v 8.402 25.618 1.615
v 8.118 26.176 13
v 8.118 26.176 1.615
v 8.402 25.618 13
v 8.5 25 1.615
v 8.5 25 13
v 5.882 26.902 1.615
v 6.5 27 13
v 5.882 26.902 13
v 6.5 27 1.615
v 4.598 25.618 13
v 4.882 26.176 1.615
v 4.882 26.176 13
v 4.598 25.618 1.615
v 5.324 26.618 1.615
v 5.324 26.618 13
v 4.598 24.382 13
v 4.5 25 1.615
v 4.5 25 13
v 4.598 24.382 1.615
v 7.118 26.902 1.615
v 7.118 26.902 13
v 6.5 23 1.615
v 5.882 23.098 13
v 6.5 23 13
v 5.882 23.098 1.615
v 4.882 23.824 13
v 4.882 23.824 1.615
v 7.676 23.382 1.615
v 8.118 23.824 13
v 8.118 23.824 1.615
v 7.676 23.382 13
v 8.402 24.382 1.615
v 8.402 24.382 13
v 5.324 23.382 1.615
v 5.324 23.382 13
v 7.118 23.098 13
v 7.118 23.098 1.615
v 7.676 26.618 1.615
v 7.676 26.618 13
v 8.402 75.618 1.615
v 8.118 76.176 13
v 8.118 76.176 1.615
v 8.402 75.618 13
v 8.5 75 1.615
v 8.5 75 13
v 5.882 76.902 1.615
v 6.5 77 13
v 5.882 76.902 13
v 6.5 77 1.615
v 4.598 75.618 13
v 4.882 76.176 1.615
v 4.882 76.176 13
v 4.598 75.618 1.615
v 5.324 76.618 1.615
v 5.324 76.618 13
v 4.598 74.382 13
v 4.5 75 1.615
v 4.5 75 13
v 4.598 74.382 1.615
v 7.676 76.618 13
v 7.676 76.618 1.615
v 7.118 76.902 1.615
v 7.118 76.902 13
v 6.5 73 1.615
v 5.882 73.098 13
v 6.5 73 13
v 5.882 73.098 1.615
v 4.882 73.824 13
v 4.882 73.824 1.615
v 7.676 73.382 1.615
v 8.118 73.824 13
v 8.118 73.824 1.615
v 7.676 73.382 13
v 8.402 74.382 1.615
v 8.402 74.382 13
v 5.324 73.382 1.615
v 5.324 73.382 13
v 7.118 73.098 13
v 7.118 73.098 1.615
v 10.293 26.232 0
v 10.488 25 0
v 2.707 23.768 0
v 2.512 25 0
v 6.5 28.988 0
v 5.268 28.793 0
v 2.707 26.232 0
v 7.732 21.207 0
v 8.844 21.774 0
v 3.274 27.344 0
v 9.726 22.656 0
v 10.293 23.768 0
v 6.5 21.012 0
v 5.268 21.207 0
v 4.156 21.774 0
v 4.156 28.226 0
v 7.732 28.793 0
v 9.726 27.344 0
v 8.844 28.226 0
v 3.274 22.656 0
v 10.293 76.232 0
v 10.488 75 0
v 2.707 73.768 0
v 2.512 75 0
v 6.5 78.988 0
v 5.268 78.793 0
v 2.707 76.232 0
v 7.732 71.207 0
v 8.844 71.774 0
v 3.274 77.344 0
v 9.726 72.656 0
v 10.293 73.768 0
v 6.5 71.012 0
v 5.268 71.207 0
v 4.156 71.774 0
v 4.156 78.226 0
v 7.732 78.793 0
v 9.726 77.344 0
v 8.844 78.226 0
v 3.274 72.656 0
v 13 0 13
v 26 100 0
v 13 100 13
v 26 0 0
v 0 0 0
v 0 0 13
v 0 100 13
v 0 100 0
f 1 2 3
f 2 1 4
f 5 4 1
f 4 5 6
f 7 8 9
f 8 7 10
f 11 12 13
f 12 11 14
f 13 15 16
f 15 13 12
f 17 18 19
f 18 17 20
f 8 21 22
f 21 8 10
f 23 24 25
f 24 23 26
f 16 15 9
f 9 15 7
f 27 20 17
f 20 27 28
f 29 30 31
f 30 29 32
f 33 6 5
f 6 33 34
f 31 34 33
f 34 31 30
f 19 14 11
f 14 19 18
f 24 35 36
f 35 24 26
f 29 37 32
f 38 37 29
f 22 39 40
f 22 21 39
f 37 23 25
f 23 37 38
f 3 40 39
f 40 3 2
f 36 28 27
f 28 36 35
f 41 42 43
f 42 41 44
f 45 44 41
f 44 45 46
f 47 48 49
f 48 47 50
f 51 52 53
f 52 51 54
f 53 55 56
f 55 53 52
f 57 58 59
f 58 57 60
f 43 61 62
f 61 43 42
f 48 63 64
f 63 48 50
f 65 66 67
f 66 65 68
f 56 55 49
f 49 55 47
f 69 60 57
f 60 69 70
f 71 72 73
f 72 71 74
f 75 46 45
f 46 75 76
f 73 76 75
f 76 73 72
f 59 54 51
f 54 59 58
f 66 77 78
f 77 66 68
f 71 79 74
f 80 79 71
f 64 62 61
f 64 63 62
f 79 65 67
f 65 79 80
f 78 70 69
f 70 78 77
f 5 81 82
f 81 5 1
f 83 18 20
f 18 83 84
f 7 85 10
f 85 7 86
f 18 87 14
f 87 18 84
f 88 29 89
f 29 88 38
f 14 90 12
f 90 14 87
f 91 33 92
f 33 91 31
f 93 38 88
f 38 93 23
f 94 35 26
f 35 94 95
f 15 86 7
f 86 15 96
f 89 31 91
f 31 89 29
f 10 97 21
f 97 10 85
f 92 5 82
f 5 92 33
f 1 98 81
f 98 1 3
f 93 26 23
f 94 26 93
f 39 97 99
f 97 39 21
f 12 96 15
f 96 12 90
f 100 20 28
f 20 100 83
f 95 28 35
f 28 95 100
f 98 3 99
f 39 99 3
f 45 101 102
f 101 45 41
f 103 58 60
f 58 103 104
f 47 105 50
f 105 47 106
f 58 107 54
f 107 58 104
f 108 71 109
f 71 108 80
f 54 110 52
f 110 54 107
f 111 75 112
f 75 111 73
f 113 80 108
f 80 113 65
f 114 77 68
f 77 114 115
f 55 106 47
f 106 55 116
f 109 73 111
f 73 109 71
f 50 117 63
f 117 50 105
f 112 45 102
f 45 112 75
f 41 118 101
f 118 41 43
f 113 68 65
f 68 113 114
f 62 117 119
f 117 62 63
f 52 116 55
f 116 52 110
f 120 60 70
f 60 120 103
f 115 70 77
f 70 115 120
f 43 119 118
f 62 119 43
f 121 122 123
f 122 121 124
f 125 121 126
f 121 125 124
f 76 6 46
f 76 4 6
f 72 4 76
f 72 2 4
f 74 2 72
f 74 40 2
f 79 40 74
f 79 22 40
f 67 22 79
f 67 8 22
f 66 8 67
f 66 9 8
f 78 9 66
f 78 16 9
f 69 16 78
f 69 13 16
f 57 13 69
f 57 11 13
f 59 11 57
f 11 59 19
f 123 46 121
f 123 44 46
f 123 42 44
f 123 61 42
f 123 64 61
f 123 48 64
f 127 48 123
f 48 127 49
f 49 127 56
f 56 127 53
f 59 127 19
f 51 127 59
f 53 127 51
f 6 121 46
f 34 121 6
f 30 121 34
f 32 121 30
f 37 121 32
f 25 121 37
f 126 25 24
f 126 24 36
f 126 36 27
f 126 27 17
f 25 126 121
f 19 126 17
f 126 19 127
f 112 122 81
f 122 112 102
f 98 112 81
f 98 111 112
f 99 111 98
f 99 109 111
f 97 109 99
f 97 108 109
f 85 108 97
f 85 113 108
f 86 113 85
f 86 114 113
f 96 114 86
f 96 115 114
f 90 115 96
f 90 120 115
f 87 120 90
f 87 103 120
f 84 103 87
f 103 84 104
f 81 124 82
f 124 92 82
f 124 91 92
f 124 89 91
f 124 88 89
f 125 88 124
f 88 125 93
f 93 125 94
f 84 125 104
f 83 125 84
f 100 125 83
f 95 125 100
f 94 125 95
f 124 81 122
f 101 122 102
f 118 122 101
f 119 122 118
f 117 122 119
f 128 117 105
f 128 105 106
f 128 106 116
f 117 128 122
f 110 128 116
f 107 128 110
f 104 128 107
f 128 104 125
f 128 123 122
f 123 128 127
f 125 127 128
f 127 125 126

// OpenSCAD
$fn=20;
height=13;
width=13;
length=100;
numholes=2;
holeradius=2;
countersinkradius=4;

difference() {
  translate([0,0,width]) rotate([270,0]) linear_extrude(height=length) polygon(points=[[0,0],[height,0],[height+width,width],[0,width],[0,0]]);    
  for(hole=[length/numholes/2:length/numholes:length-1]) {
      translate([height/2,hole,-1]) cylinder(r=holeradius,h=width+2);
  }
  for(hole=[length/numholes/2:length/numholes:length-1]) {
      translate([height/2,hole,-0.01]) cylinder(r1=countersinkradius,r2=0,h=width/4);
  }
}
